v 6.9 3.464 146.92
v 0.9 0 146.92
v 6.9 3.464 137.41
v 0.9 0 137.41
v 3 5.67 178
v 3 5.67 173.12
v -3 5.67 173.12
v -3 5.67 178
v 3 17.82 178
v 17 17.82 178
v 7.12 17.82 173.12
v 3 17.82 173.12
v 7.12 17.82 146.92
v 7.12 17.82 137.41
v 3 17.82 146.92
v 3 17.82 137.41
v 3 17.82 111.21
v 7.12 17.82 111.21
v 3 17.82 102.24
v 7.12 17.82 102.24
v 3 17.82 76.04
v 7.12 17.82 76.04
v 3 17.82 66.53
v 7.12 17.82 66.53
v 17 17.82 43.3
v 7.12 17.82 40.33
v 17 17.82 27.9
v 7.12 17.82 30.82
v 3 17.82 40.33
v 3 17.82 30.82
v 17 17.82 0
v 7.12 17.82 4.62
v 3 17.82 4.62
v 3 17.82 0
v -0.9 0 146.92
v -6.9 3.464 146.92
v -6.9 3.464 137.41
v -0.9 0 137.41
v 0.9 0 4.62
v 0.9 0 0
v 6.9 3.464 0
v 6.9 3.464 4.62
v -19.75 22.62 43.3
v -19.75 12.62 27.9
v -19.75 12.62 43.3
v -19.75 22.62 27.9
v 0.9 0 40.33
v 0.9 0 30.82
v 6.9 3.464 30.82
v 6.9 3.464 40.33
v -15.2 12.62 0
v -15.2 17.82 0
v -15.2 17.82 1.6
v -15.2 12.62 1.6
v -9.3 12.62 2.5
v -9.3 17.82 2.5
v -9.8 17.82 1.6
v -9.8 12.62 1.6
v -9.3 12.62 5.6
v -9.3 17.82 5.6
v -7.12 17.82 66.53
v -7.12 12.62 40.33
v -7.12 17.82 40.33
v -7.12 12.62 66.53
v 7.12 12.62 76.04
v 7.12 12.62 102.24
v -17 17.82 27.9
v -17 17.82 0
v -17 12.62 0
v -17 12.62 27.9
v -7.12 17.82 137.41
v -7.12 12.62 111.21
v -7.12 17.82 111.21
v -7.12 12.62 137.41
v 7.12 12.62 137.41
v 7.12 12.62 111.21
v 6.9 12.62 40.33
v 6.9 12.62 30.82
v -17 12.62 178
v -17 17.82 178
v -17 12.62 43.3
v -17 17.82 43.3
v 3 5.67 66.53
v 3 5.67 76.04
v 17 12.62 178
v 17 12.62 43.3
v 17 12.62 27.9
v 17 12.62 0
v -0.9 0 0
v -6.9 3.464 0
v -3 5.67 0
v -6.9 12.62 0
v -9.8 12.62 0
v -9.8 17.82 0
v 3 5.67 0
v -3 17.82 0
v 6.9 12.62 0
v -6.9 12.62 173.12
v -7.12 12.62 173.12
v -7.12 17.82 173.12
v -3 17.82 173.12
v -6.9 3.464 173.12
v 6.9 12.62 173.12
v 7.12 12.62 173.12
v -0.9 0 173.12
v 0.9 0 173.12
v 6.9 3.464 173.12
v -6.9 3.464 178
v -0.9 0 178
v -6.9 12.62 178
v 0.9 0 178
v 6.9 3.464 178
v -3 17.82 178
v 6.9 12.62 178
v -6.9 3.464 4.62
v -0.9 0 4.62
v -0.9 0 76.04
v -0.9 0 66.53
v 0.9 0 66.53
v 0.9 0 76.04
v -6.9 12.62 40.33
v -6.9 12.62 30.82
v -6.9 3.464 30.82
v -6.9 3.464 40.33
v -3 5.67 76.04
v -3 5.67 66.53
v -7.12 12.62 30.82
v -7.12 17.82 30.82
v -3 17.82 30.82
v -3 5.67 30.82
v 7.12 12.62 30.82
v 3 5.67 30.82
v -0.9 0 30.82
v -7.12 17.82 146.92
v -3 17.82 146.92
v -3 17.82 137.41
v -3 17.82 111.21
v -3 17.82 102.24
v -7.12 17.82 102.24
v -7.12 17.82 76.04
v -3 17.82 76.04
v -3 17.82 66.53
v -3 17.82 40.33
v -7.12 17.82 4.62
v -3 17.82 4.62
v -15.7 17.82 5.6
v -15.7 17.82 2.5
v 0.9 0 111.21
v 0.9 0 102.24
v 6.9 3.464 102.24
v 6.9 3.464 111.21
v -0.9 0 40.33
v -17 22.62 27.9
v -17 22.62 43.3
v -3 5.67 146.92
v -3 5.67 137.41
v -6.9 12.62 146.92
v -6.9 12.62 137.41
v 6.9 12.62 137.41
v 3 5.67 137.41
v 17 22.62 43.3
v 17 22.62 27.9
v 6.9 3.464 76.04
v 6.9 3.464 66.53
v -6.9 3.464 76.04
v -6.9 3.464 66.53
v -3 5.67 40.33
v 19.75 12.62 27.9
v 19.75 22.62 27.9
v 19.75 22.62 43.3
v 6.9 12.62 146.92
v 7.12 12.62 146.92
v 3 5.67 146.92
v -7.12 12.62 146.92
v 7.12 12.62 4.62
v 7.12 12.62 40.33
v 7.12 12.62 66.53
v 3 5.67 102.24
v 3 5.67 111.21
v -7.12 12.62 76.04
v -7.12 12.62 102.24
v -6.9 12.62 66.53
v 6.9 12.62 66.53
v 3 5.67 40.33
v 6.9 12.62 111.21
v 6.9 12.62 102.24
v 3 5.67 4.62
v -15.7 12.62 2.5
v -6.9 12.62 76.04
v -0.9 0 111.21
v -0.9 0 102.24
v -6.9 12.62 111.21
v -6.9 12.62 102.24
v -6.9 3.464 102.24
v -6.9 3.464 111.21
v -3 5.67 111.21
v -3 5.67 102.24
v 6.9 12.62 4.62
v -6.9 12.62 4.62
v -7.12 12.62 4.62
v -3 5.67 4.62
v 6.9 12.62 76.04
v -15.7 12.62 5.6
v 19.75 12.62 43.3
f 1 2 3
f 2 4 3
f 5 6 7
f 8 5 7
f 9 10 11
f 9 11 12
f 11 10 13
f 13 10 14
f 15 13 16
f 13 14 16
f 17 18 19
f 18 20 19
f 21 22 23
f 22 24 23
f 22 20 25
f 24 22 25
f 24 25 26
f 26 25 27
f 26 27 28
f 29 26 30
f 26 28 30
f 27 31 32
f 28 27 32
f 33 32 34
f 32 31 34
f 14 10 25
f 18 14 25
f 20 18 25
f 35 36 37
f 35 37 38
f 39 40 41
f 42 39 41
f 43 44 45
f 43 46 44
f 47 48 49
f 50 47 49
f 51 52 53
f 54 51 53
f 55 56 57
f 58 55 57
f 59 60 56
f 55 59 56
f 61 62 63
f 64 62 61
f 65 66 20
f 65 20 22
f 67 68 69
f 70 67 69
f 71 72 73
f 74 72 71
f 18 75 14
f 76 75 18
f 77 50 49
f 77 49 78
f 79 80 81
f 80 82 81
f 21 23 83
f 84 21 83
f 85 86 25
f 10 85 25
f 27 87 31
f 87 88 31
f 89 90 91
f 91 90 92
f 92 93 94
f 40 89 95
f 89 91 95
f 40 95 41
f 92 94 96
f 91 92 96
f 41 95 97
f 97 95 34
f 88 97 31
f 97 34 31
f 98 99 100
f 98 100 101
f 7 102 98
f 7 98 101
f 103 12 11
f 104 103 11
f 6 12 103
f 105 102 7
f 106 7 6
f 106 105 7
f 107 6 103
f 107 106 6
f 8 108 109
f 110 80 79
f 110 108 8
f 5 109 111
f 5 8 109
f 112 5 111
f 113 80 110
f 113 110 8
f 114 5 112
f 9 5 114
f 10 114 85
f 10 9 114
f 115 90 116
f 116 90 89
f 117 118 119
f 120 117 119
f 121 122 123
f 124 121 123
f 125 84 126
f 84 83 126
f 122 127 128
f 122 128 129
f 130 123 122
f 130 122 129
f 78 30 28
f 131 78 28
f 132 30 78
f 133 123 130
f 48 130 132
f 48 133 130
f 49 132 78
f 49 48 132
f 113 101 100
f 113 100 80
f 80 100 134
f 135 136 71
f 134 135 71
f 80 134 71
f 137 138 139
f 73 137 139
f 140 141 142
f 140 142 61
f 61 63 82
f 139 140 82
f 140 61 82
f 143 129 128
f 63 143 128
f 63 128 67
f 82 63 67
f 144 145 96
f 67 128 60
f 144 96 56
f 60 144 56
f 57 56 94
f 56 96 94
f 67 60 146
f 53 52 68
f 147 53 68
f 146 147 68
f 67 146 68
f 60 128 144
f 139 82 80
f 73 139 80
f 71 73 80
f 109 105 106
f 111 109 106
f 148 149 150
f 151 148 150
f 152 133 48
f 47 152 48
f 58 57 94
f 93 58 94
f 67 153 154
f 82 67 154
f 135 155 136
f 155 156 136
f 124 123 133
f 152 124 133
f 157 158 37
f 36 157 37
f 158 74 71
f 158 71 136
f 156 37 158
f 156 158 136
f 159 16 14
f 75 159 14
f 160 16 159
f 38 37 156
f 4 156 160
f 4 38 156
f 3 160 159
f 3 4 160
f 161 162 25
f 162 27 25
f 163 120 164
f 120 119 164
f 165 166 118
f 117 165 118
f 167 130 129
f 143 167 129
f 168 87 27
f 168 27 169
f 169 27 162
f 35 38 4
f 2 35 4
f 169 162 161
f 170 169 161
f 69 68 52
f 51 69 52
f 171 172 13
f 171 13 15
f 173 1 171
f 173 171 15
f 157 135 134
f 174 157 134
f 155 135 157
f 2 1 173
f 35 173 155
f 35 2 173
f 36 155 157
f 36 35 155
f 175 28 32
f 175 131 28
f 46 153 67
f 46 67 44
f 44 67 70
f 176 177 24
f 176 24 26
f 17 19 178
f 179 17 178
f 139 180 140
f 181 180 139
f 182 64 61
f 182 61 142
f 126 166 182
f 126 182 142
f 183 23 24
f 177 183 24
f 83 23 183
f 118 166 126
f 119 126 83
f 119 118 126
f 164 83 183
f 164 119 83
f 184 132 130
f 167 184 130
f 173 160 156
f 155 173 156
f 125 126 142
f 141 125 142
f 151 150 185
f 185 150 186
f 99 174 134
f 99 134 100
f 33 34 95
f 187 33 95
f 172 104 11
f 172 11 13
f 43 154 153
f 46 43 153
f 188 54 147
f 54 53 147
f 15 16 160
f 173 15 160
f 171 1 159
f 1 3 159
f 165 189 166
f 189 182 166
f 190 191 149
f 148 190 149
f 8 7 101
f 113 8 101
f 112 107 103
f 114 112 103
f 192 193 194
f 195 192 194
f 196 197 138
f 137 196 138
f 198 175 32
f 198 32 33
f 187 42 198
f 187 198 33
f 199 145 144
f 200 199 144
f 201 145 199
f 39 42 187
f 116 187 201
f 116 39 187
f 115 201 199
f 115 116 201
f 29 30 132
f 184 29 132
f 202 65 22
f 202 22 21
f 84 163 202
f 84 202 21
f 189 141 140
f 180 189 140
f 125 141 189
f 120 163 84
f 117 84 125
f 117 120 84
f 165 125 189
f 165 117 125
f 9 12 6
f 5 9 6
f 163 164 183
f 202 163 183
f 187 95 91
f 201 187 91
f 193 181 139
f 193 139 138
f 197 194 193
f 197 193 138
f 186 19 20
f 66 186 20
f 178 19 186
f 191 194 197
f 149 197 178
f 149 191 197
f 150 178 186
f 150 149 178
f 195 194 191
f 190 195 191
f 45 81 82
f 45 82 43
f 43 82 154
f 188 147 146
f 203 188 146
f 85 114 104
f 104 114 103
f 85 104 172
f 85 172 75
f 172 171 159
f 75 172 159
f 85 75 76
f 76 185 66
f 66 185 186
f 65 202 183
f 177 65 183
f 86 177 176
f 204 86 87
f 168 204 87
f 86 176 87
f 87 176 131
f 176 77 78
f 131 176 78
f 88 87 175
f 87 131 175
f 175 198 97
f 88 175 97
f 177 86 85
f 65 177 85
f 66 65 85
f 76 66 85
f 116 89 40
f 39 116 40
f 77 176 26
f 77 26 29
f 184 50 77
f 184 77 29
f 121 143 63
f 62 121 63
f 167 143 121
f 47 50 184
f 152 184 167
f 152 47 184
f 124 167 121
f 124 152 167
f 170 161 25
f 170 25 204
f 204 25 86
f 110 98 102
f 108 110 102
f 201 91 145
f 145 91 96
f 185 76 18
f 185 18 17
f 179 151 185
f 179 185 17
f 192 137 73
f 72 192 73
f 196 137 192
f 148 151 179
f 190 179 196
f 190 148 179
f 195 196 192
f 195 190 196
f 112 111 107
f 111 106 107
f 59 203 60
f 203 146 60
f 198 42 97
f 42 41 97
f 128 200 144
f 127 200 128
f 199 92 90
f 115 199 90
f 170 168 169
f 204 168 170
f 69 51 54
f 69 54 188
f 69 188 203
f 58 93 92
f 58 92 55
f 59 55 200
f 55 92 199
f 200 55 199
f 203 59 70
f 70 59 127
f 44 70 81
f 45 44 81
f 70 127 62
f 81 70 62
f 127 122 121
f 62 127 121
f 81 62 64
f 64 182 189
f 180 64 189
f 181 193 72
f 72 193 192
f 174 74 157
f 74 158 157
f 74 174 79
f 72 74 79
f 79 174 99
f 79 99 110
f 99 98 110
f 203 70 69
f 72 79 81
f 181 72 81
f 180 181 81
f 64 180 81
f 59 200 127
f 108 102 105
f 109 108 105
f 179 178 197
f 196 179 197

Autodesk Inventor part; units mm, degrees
sketch "Sketch_1" plane through (0, 0, 0) normal (0, 0, 1) x (1, 0, 0)
  line L0 (-17, 17.82) -> (-17, 12.62)
  line L1 (-17, 12.62) -> (-6.9, 12.62)
  line L2 (-6.9, 12.62) -> (-6.9, 3.4641)
  line L3 (-6.9, 3.4641) -> (-0.9, 0)
  line L4 (-0.9, 0) -> (0.9, 0)
  line L5 (0.9, 0) -> (6.9, 3.4641)
  line L6 (6.9, 3.4641) -> (6.9, 12.62)
  line L7 (6.9, 12.62) -> (17, 12.62)
  line L8 (17, 12.62) -> (17, 17.82)
  line L9 (17, 17.82) -> (3, 17.82)
  line L10 (3, 17.82) -> (3, 5.67)
  line L11 (3, 5.67) -> (-3, 5.67)
  line L12 (-3, 5.67) -> (-3, 17.82)
  line L13 (-3, 17.82) -> (-17, 17.82)
extrude "Extrusion1" add sketch "Sketch_1" along normal blind 178
sketch "Sketch_9" plane through (0, 0, 0) normal (0, 1, 0) x (-1, 0, 0)
  line L0 (7.12, 4.62) -> (7.12, 30.82)
  line L1 (7.12, 30.82) -> (-7.12, 30.82)
  line L2 (-7.12, 30.82) -> (-7.12, 4.62)
  line L3 (-7.12, 4.62) -> (7.12, 4.62)
extrude "Extrusion2" cut sketch "Sketch_9" along normal blind 25
sketch "Sketch_2" plane through (0, 0, 0) normal (0, 1, 0) x (-1, 0, 0)
  line L0 (7.12, 40.33) -> (7.12, 66.53)
  line L1 (7.12, 66.53) -> (-7.12, 66.53)
  line L2 (-7.12, 66.53) -> (-7.12, 40.33)
  line L3 (-7.12, 40.33) -> (7.12, 40.33)
extrude "Extrusion3" cut sketch "Sketch_2" along normal blind 25
sketch "Sketch_3" plane through (0, 0, 0) normal (0, 1, 0) x (-1, 0, 0)
  line L0 (7.12, 76.04) -> (7.12, 102.24)
  line L1 (7.12, 102.24) -> (-7.12, 102.24)
  line L2 (-7.12, 102.24) -> (-7.12, 76.04)
  line L3 (-7.12, 76.04) -> (7.12, 76.04)
extrude "Extrusion4" cut sketch "Sketch_3" along normal blind 25
sketch "Sketch_4" plane through (0, 0, 0) normal (0, 1, 0) x (-1, 0, 0)
  line L0 (7.12, 111.21) -> (7.12, 137.41)
  line L1 (7.12, 137.41) -> (-7.12, 137.41)
  line L2 (-7.12, 137.41) -> (-7.12, 111.21)
  line L3 (-7.12, 111.21) -> (7.12, 111.21)
extrude "Extrusion5" cut sketch "Sketch_4" along normal blind 25
sketch "Sketch_5" plane through (0, 0, 0) normal (0, 1, 0) x (-1, 0, 0)
  line L0 (7.12, 146.92) -> (7.12, 173.12)
  line L1 (7.12, 173.12) -> (-7.12, 173.12)
  line L2 (-7.12, 173.12) -> (-7.12, 146.92)
  line L3 (-7.12, 146.92) -> (7.12, 146.92)
extrude "Extrusion6" cut sketch "Sketch_5" along normal blind 25
sketch "Sketch_12" plane through (17, 17.82, 0) normal (0, 1, 0) x (-1, 0, 0)
  line L0 (26.3, 5.6) -> (26.3, 2.5)
  line L1 (26.3, 2.5) -> (26.8, 1.6)
  line L2 (26.8, 1.6) -> (26.8, 0)
  line L3 (26.8, 0) -> (32.2, 0)
  line L4 (32.2, 0) -> (32.2, 1.6)
  line L5 (32.2, 1.6) -> (32.7, 2.5)
  line L6 (32.7, 2.5) -> (32.7, 5.6)
  line L7 (32.7, 5.6) -> (26.3, 5.6)
extrude "Extrusion8" cut sketch "Sketch_12" against normal blind 6
sketch "Sketch_16" plane through (-17, 12.62, 0) normal (-1, 0, 0) x (0, 0, 1)
  line L0 (27.9, 10) -> (27.9, 0)
  line L1 (27.9, 0) -> (43.3, 0)
  line L2 (43.3, 0) -> (43.3, 10)
  line L3 (43.3, 10) -> (27.9, 10)
extrude "Extrusion9" add sketch "Sketch_16" along normal blind 2.75
sketch "Sketch_14" plane through (17, 17.82, 0) normal (1, 0, 0) x (0, 0, 1)
  line L0 (27.9, -4.8) -> (43.3, -4.8)
  line L1 (43.3, -4.8) -> (43.3, 5.2)
  line L2 (43.3, 5.2) -> (27.9, 5.2)
  line L3 (27.9, 5.2) -> (27.9, -4.8)
extrude "Extrusion10" add sketch "Sketch_14" along normal blind 2.75
ref_plane "p1_XY" through (0, 0, 0) normal (0, 1, 0) x (1, 0, 0)
ref_plane "p1_YZ" through (0, 0, 0) normal (1, 0, 0) x (0, 0, -1)
ref_plane "p1_ZX" through (0, 0, 0) normal (0, 0, -1) x (0, 1, 0)
properties part number "PRO10315 Rolle fuer Rollenleiste 178"
